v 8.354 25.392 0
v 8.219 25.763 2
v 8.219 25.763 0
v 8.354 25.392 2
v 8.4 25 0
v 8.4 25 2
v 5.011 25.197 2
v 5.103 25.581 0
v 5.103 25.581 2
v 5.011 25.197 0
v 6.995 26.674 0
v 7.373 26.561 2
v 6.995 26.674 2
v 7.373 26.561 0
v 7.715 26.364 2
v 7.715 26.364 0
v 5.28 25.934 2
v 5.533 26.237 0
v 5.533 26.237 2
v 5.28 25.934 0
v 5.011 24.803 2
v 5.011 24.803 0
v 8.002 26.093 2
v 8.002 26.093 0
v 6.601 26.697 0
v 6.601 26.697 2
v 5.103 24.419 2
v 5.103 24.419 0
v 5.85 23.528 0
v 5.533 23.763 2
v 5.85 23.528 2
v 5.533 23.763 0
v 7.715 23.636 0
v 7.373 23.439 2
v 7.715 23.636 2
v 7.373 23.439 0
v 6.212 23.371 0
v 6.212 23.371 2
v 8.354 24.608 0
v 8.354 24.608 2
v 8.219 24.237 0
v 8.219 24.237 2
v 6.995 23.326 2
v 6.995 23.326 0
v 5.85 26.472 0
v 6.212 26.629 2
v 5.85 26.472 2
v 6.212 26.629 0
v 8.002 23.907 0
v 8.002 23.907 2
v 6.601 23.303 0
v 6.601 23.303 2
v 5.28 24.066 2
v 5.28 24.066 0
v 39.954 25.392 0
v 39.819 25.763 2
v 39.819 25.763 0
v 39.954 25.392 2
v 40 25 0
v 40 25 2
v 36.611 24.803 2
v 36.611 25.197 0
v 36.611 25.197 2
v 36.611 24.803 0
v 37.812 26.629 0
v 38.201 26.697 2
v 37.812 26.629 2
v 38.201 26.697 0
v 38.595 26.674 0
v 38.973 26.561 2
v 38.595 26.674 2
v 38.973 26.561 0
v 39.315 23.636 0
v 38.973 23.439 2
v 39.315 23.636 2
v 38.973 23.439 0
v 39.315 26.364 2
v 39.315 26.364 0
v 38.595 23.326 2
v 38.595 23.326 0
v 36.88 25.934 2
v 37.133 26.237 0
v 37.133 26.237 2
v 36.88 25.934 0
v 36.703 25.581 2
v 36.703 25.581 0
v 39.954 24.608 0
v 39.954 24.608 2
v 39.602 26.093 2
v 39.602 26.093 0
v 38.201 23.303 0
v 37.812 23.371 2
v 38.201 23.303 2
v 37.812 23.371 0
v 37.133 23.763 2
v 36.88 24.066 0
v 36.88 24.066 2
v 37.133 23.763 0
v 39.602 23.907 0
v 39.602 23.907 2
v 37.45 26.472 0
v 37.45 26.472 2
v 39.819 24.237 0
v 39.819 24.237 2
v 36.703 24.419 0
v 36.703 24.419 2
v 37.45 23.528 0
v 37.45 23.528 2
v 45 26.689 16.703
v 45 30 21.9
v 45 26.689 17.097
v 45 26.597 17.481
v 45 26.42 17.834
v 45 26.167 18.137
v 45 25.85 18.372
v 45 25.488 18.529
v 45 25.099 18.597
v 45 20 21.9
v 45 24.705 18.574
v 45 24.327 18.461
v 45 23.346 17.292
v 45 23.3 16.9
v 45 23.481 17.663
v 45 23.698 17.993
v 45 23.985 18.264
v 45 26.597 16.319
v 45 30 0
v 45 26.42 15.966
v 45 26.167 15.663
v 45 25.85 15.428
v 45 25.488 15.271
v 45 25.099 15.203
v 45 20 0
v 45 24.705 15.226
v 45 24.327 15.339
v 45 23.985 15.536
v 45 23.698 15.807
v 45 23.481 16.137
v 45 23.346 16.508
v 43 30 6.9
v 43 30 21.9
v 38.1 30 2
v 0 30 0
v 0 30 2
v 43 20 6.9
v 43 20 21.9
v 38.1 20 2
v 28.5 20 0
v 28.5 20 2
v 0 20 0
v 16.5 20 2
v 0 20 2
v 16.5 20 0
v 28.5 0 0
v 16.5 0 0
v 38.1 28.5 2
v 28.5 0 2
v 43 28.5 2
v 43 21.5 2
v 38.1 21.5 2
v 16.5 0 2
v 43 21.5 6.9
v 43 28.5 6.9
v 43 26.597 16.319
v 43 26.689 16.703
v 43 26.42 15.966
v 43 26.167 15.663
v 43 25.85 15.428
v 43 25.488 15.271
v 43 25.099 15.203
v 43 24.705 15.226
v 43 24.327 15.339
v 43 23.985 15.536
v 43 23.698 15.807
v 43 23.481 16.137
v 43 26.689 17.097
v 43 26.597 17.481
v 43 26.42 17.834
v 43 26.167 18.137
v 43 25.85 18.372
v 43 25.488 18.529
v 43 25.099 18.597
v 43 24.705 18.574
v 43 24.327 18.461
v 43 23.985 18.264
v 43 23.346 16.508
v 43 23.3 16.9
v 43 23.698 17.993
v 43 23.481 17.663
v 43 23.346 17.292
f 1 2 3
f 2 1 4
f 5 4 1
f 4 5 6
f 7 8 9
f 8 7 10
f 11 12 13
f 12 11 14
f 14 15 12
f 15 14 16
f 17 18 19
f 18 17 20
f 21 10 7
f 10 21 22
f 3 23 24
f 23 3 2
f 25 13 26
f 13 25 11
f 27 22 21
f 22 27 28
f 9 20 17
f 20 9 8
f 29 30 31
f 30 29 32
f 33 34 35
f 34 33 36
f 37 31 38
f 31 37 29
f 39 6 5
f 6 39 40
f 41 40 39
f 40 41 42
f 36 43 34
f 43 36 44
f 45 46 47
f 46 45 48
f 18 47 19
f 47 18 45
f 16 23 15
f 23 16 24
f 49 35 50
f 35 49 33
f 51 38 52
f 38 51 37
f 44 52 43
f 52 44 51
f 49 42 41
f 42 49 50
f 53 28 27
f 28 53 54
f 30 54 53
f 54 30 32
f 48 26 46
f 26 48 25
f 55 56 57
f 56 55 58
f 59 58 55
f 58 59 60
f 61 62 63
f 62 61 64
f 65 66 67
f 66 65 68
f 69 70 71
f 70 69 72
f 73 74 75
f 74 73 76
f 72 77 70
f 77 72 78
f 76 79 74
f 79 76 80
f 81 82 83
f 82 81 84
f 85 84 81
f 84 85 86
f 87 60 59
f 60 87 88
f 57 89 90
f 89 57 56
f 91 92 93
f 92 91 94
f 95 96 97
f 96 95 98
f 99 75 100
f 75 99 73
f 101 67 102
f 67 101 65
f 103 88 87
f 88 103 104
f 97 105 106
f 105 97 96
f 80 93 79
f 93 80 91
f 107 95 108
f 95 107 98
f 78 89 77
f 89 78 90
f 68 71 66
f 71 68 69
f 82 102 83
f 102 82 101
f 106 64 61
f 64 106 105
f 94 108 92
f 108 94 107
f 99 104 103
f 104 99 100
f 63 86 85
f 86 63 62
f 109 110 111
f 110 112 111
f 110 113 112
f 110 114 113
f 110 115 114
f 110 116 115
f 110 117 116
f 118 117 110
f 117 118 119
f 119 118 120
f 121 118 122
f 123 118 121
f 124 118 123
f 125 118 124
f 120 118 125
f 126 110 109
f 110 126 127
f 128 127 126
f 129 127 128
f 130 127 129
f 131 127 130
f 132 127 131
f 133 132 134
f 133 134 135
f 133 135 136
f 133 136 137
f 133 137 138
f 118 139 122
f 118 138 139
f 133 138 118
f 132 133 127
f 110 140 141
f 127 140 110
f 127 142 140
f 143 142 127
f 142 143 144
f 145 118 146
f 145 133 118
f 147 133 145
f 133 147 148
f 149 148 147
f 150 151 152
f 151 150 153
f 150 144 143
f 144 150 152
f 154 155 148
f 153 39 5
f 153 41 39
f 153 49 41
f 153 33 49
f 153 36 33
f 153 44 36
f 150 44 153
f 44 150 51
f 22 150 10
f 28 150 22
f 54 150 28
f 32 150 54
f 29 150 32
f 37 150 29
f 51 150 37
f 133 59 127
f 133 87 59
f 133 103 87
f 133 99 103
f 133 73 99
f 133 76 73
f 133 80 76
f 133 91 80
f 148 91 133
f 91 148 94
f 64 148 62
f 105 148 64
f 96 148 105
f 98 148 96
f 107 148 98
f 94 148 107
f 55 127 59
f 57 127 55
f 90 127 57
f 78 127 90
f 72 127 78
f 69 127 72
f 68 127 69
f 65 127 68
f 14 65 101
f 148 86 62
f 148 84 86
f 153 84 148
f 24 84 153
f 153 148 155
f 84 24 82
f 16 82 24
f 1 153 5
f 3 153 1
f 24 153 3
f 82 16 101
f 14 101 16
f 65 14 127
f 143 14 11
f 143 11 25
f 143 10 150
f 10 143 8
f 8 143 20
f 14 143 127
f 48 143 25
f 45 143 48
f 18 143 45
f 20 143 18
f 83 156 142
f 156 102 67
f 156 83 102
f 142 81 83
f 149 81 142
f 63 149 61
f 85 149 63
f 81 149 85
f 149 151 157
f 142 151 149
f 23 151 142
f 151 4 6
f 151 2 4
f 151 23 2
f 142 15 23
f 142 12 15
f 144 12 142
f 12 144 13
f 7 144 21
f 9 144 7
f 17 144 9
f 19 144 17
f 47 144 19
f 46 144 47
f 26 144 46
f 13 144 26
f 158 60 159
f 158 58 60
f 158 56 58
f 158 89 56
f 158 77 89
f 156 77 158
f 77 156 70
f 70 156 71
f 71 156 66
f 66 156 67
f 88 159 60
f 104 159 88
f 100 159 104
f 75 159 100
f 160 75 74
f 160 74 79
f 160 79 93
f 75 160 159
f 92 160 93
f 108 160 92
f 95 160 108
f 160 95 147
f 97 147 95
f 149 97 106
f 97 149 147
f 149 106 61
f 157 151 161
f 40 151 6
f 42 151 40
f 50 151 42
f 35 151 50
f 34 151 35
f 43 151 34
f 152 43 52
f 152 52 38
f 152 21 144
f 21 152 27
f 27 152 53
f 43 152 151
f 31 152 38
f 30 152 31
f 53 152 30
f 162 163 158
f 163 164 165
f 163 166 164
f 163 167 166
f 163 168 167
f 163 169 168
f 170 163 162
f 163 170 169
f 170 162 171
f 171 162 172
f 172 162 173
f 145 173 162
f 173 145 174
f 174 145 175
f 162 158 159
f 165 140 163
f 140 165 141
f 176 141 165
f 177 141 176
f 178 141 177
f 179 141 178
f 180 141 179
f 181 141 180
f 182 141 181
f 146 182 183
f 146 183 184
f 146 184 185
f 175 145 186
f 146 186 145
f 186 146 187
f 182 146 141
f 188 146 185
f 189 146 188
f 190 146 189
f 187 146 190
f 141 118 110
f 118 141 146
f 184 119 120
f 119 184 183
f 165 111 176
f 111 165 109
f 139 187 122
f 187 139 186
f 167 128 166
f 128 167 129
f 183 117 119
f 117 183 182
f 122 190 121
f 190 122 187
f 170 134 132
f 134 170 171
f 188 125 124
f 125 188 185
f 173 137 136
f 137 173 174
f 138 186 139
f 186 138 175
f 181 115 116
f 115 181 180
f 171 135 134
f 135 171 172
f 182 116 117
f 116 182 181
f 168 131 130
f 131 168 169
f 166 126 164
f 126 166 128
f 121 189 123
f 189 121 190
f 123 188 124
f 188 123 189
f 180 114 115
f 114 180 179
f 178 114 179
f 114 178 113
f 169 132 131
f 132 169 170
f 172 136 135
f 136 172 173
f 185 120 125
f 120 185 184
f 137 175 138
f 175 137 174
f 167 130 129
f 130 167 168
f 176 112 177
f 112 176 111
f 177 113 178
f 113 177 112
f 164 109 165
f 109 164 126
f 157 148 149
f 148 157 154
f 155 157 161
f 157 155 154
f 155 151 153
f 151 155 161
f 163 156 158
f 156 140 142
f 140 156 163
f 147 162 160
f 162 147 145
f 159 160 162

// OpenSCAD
// Halter für die Abschirmung zwischen PA und RX

// Resolution for 3D printing:
$fa = 1;
$fs = 0.4;

// Allgemeines:
delta                  =   0.1; // Standard Durchdringung

material_dicke         =   2.0;

querbalken_breite      =  45.0;
querbalken_dicke       =  material_dicke;
querbalken_hoehe       =  10.0;
querbalken_lochabstand =   5.0;

lasche_breite          =  12.0;
lasche_dicke           =  material_dicke;
lasche_hoehe           =  20.0;

halter_breite          =  material_dicke;
halter_dicke           =  20.0;
halter_hoehe           =  querbalken_hoehe;
halter_lochabstand     =   5.0;

loch_durchmesser       =   3.4;

verstaerkung_dx        =   5.0;
verstaerkung_dy        =   5.0;
verstaerkung_dz        =   1.5;

module loch() {
    cylinder(material_dicke + 4*delta, d=loch_durchmesser,
             center=true);
};

module lasche() {
    cube([lasche_breite, lasche_dicke,
          lasche_hoehe + delta]);
};

module querbalken_loch() {
    translate([0, material_dicke / 2 - delta, 0])
        rotate([90, 0, 0])
    loch();
};

module querbalken_loecher() {
    // Linkes Loch:
    translate([querbalken_lochabstand + loch_durchmesser/2,
              0, querbalken_hoehe/2])
        querbalken_loch();
    // Rechtes Loch:
    translate([querbalken_breite - 
              (querbalken_lochabstand + loch_durchmesser/2),
              0, querbalken_hoehe/2])
        querbalken_loch();
};

module querbalken() {
    difference() {
        cube([querbalken_breite,
              querbalken_dicke,
              querbalken_hoehe]);
        querbalken_loecher();
    };
};

module halter_loch() {
    translate([halter_breite / 2, 
              halter_lochabstand, 
              halter_hoehe / 2])
        rotate([0, 90, 0])
    loch();
};

module halter() {
    difference() {
        cube([halter_breite, halter_dicke + delta,
             halter_hoehe]);
        halter_loch();
    };
};

module dreieck(dim) {
    linear_extrude(height=dim.z, center=false)
        polygon(points=[[0, 0], [0, dim.x], [dim.y, 0]]); 
};

module verstaerkung() {
    dreieck([verstaerkung_dx + delta,
             verstaerkung_dy + delta,
             verstaerkung_dz]);
};

module bauteil() {
    // Lasche:
    translate([(querbalken_breite - lasche_breite) / 2,
              0, 0])
        lasche();
    // Querbalken:
    translate([0, 0, lasche_hoehe])
        querbalken();
    // Halter:
    translate([querbalken_breite - halter_breite,
              -halter_dicke +delta,
              lasche_hoehe])
        halter();
    // Versärkung oben:
    translate([querbalken_breite - halter_breite + delta,
               delta, querbalken_hoehe + lasche_hoehe -
               verstaerkung_dz])
        rotate([0, 0, 180])
            verstaerkung();
    // Versärkung unten:
    translate([querbalken_breite - halter_breite + delta,
               delta, lasche_hoehe])
        rotate([0, 0, 180])
            verstaerkung();
};

translate([0, 0, material_dicke])
    rotate([-90, 0, 0])
        bauteil();
